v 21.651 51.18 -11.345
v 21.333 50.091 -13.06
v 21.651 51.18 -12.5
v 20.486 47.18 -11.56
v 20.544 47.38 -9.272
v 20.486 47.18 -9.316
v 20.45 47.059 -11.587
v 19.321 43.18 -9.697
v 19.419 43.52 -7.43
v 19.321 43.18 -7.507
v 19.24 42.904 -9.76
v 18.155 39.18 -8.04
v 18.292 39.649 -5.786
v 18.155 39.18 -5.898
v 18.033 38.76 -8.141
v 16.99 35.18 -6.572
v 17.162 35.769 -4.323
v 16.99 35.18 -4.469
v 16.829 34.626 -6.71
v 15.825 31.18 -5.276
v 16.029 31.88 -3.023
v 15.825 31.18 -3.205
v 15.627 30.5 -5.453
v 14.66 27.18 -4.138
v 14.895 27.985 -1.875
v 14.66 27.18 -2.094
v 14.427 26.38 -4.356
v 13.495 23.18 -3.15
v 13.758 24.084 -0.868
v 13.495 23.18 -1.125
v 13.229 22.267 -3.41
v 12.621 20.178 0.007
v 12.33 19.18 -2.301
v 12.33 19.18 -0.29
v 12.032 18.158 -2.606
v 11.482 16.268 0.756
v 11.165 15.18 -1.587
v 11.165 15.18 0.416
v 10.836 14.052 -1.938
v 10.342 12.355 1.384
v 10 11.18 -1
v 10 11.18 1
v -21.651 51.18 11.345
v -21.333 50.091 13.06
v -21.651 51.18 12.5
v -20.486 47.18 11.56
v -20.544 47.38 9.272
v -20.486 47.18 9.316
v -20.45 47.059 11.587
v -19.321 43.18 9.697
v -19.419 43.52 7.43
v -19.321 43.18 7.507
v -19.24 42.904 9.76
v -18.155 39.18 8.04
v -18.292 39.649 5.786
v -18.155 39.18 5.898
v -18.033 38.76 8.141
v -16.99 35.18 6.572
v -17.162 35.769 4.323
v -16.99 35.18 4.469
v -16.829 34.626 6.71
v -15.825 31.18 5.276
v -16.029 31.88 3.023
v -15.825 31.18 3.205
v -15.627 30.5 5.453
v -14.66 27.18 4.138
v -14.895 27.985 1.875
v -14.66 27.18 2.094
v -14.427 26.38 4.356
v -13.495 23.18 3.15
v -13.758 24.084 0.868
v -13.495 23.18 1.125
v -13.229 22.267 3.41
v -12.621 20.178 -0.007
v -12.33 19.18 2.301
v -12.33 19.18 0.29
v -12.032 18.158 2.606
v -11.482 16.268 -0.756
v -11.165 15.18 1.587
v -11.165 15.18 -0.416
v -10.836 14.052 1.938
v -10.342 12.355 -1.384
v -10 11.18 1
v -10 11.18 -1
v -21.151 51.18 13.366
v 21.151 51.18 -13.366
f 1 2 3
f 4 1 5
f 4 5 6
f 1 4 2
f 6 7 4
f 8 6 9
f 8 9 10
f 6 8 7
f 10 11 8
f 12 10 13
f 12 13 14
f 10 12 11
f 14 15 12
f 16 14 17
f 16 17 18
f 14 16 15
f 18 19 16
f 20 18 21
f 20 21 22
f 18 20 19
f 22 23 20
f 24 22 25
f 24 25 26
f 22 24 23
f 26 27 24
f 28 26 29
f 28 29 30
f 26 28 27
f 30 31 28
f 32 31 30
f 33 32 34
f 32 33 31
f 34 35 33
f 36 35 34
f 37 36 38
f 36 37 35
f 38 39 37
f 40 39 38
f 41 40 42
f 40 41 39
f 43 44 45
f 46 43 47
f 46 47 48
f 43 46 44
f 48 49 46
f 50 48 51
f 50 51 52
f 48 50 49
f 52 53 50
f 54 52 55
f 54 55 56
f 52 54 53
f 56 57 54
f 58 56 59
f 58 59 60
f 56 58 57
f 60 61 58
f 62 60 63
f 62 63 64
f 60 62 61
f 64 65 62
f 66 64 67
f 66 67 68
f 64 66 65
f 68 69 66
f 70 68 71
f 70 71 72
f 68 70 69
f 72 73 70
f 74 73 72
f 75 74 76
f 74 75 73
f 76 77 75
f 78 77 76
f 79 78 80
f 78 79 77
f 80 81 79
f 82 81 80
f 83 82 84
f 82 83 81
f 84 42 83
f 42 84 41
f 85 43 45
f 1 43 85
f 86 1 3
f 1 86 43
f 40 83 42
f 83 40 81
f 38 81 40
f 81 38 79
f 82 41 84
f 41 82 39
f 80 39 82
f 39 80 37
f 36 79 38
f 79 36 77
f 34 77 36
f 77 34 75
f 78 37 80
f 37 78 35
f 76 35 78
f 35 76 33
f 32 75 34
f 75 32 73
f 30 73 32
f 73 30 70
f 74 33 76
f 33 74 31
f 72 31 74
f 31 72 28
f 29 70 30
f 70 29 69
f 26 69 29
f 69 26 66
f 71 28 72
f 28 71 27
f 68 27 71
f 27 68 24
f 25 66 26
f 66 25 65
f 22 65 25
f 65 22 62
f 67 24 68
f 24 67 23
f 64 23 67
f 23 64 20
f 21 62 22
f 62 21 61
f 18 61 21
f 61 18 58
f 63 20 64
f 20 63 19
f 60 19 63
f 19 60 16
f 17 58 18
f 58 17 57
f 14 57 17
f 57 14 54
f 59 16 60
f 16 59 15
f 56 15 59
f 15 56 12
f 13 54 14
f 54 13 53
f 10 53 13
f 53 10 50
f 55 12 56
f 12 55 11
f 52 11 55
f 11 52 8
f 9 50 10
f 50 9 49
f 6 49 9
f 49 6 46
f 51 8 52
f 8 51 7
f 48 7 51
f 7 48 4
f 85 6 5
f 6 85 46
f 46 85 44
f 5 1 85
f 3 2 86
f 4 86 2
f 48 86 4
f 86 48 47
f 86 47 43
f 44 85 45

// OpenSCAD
module fan_wheel(
    outer_radius = 55,
    inner_radius = 15,
    blade_count = 8,
    outer_width = 50,
    inner_width = 20,
    thickness = 2,
    twist = -30,
    angle_of_attack = 45,
) {
    
    module blade() {
        
        inner_height = cos( asin( inner_width / ( 2 * inner_radius ) )) * inner_radius;
        
        blade_height = outer_radius - inner_radius;
        
        width = outer_width / 2 - inner_width / 2;
        
        depth = 
            sqrt(
                pow( ( outer_width / 2 * cos( abs ( twist ) ) ) -
                        ( inner_width / 2 ), 2 ) +
                pow (blade_height, 2 )
            ) + thickness;
        
        height = sin ( abs ( twist ) ) * outer_width / 2 + thickness;
        
        angle = 
            atan(
                    ( ( outer_width / 2 * cos( abs ( twist ) ) ) -
                        ( inner_width / 2 )
                    ) / blade_height
            );
        
        difference() {
        
            translate( [ 0, inner_height, 0 ])
            rotate( [-90, 0, 0 ] )
            linear_extrude(
                height = blade_height,
                twist = twist,
                slices = 10,
                convexity = 10
            )
            square( [outer_width, thickness], center = true);
            
            for ( i = [0 : 1])
            mirror( [i, 0, 0] )
            translate( [ inner_width / 2, inner_height, -height ] )
            rotate( [ 0, 0, -angle] )
            translate( [ 0, -depth / 2, 0 ] )
            cube( [ width * 2, depth * 1.5, 2 * height] );
        }
        
    }
    
    blade(); // debug
}

fan_wheel();
